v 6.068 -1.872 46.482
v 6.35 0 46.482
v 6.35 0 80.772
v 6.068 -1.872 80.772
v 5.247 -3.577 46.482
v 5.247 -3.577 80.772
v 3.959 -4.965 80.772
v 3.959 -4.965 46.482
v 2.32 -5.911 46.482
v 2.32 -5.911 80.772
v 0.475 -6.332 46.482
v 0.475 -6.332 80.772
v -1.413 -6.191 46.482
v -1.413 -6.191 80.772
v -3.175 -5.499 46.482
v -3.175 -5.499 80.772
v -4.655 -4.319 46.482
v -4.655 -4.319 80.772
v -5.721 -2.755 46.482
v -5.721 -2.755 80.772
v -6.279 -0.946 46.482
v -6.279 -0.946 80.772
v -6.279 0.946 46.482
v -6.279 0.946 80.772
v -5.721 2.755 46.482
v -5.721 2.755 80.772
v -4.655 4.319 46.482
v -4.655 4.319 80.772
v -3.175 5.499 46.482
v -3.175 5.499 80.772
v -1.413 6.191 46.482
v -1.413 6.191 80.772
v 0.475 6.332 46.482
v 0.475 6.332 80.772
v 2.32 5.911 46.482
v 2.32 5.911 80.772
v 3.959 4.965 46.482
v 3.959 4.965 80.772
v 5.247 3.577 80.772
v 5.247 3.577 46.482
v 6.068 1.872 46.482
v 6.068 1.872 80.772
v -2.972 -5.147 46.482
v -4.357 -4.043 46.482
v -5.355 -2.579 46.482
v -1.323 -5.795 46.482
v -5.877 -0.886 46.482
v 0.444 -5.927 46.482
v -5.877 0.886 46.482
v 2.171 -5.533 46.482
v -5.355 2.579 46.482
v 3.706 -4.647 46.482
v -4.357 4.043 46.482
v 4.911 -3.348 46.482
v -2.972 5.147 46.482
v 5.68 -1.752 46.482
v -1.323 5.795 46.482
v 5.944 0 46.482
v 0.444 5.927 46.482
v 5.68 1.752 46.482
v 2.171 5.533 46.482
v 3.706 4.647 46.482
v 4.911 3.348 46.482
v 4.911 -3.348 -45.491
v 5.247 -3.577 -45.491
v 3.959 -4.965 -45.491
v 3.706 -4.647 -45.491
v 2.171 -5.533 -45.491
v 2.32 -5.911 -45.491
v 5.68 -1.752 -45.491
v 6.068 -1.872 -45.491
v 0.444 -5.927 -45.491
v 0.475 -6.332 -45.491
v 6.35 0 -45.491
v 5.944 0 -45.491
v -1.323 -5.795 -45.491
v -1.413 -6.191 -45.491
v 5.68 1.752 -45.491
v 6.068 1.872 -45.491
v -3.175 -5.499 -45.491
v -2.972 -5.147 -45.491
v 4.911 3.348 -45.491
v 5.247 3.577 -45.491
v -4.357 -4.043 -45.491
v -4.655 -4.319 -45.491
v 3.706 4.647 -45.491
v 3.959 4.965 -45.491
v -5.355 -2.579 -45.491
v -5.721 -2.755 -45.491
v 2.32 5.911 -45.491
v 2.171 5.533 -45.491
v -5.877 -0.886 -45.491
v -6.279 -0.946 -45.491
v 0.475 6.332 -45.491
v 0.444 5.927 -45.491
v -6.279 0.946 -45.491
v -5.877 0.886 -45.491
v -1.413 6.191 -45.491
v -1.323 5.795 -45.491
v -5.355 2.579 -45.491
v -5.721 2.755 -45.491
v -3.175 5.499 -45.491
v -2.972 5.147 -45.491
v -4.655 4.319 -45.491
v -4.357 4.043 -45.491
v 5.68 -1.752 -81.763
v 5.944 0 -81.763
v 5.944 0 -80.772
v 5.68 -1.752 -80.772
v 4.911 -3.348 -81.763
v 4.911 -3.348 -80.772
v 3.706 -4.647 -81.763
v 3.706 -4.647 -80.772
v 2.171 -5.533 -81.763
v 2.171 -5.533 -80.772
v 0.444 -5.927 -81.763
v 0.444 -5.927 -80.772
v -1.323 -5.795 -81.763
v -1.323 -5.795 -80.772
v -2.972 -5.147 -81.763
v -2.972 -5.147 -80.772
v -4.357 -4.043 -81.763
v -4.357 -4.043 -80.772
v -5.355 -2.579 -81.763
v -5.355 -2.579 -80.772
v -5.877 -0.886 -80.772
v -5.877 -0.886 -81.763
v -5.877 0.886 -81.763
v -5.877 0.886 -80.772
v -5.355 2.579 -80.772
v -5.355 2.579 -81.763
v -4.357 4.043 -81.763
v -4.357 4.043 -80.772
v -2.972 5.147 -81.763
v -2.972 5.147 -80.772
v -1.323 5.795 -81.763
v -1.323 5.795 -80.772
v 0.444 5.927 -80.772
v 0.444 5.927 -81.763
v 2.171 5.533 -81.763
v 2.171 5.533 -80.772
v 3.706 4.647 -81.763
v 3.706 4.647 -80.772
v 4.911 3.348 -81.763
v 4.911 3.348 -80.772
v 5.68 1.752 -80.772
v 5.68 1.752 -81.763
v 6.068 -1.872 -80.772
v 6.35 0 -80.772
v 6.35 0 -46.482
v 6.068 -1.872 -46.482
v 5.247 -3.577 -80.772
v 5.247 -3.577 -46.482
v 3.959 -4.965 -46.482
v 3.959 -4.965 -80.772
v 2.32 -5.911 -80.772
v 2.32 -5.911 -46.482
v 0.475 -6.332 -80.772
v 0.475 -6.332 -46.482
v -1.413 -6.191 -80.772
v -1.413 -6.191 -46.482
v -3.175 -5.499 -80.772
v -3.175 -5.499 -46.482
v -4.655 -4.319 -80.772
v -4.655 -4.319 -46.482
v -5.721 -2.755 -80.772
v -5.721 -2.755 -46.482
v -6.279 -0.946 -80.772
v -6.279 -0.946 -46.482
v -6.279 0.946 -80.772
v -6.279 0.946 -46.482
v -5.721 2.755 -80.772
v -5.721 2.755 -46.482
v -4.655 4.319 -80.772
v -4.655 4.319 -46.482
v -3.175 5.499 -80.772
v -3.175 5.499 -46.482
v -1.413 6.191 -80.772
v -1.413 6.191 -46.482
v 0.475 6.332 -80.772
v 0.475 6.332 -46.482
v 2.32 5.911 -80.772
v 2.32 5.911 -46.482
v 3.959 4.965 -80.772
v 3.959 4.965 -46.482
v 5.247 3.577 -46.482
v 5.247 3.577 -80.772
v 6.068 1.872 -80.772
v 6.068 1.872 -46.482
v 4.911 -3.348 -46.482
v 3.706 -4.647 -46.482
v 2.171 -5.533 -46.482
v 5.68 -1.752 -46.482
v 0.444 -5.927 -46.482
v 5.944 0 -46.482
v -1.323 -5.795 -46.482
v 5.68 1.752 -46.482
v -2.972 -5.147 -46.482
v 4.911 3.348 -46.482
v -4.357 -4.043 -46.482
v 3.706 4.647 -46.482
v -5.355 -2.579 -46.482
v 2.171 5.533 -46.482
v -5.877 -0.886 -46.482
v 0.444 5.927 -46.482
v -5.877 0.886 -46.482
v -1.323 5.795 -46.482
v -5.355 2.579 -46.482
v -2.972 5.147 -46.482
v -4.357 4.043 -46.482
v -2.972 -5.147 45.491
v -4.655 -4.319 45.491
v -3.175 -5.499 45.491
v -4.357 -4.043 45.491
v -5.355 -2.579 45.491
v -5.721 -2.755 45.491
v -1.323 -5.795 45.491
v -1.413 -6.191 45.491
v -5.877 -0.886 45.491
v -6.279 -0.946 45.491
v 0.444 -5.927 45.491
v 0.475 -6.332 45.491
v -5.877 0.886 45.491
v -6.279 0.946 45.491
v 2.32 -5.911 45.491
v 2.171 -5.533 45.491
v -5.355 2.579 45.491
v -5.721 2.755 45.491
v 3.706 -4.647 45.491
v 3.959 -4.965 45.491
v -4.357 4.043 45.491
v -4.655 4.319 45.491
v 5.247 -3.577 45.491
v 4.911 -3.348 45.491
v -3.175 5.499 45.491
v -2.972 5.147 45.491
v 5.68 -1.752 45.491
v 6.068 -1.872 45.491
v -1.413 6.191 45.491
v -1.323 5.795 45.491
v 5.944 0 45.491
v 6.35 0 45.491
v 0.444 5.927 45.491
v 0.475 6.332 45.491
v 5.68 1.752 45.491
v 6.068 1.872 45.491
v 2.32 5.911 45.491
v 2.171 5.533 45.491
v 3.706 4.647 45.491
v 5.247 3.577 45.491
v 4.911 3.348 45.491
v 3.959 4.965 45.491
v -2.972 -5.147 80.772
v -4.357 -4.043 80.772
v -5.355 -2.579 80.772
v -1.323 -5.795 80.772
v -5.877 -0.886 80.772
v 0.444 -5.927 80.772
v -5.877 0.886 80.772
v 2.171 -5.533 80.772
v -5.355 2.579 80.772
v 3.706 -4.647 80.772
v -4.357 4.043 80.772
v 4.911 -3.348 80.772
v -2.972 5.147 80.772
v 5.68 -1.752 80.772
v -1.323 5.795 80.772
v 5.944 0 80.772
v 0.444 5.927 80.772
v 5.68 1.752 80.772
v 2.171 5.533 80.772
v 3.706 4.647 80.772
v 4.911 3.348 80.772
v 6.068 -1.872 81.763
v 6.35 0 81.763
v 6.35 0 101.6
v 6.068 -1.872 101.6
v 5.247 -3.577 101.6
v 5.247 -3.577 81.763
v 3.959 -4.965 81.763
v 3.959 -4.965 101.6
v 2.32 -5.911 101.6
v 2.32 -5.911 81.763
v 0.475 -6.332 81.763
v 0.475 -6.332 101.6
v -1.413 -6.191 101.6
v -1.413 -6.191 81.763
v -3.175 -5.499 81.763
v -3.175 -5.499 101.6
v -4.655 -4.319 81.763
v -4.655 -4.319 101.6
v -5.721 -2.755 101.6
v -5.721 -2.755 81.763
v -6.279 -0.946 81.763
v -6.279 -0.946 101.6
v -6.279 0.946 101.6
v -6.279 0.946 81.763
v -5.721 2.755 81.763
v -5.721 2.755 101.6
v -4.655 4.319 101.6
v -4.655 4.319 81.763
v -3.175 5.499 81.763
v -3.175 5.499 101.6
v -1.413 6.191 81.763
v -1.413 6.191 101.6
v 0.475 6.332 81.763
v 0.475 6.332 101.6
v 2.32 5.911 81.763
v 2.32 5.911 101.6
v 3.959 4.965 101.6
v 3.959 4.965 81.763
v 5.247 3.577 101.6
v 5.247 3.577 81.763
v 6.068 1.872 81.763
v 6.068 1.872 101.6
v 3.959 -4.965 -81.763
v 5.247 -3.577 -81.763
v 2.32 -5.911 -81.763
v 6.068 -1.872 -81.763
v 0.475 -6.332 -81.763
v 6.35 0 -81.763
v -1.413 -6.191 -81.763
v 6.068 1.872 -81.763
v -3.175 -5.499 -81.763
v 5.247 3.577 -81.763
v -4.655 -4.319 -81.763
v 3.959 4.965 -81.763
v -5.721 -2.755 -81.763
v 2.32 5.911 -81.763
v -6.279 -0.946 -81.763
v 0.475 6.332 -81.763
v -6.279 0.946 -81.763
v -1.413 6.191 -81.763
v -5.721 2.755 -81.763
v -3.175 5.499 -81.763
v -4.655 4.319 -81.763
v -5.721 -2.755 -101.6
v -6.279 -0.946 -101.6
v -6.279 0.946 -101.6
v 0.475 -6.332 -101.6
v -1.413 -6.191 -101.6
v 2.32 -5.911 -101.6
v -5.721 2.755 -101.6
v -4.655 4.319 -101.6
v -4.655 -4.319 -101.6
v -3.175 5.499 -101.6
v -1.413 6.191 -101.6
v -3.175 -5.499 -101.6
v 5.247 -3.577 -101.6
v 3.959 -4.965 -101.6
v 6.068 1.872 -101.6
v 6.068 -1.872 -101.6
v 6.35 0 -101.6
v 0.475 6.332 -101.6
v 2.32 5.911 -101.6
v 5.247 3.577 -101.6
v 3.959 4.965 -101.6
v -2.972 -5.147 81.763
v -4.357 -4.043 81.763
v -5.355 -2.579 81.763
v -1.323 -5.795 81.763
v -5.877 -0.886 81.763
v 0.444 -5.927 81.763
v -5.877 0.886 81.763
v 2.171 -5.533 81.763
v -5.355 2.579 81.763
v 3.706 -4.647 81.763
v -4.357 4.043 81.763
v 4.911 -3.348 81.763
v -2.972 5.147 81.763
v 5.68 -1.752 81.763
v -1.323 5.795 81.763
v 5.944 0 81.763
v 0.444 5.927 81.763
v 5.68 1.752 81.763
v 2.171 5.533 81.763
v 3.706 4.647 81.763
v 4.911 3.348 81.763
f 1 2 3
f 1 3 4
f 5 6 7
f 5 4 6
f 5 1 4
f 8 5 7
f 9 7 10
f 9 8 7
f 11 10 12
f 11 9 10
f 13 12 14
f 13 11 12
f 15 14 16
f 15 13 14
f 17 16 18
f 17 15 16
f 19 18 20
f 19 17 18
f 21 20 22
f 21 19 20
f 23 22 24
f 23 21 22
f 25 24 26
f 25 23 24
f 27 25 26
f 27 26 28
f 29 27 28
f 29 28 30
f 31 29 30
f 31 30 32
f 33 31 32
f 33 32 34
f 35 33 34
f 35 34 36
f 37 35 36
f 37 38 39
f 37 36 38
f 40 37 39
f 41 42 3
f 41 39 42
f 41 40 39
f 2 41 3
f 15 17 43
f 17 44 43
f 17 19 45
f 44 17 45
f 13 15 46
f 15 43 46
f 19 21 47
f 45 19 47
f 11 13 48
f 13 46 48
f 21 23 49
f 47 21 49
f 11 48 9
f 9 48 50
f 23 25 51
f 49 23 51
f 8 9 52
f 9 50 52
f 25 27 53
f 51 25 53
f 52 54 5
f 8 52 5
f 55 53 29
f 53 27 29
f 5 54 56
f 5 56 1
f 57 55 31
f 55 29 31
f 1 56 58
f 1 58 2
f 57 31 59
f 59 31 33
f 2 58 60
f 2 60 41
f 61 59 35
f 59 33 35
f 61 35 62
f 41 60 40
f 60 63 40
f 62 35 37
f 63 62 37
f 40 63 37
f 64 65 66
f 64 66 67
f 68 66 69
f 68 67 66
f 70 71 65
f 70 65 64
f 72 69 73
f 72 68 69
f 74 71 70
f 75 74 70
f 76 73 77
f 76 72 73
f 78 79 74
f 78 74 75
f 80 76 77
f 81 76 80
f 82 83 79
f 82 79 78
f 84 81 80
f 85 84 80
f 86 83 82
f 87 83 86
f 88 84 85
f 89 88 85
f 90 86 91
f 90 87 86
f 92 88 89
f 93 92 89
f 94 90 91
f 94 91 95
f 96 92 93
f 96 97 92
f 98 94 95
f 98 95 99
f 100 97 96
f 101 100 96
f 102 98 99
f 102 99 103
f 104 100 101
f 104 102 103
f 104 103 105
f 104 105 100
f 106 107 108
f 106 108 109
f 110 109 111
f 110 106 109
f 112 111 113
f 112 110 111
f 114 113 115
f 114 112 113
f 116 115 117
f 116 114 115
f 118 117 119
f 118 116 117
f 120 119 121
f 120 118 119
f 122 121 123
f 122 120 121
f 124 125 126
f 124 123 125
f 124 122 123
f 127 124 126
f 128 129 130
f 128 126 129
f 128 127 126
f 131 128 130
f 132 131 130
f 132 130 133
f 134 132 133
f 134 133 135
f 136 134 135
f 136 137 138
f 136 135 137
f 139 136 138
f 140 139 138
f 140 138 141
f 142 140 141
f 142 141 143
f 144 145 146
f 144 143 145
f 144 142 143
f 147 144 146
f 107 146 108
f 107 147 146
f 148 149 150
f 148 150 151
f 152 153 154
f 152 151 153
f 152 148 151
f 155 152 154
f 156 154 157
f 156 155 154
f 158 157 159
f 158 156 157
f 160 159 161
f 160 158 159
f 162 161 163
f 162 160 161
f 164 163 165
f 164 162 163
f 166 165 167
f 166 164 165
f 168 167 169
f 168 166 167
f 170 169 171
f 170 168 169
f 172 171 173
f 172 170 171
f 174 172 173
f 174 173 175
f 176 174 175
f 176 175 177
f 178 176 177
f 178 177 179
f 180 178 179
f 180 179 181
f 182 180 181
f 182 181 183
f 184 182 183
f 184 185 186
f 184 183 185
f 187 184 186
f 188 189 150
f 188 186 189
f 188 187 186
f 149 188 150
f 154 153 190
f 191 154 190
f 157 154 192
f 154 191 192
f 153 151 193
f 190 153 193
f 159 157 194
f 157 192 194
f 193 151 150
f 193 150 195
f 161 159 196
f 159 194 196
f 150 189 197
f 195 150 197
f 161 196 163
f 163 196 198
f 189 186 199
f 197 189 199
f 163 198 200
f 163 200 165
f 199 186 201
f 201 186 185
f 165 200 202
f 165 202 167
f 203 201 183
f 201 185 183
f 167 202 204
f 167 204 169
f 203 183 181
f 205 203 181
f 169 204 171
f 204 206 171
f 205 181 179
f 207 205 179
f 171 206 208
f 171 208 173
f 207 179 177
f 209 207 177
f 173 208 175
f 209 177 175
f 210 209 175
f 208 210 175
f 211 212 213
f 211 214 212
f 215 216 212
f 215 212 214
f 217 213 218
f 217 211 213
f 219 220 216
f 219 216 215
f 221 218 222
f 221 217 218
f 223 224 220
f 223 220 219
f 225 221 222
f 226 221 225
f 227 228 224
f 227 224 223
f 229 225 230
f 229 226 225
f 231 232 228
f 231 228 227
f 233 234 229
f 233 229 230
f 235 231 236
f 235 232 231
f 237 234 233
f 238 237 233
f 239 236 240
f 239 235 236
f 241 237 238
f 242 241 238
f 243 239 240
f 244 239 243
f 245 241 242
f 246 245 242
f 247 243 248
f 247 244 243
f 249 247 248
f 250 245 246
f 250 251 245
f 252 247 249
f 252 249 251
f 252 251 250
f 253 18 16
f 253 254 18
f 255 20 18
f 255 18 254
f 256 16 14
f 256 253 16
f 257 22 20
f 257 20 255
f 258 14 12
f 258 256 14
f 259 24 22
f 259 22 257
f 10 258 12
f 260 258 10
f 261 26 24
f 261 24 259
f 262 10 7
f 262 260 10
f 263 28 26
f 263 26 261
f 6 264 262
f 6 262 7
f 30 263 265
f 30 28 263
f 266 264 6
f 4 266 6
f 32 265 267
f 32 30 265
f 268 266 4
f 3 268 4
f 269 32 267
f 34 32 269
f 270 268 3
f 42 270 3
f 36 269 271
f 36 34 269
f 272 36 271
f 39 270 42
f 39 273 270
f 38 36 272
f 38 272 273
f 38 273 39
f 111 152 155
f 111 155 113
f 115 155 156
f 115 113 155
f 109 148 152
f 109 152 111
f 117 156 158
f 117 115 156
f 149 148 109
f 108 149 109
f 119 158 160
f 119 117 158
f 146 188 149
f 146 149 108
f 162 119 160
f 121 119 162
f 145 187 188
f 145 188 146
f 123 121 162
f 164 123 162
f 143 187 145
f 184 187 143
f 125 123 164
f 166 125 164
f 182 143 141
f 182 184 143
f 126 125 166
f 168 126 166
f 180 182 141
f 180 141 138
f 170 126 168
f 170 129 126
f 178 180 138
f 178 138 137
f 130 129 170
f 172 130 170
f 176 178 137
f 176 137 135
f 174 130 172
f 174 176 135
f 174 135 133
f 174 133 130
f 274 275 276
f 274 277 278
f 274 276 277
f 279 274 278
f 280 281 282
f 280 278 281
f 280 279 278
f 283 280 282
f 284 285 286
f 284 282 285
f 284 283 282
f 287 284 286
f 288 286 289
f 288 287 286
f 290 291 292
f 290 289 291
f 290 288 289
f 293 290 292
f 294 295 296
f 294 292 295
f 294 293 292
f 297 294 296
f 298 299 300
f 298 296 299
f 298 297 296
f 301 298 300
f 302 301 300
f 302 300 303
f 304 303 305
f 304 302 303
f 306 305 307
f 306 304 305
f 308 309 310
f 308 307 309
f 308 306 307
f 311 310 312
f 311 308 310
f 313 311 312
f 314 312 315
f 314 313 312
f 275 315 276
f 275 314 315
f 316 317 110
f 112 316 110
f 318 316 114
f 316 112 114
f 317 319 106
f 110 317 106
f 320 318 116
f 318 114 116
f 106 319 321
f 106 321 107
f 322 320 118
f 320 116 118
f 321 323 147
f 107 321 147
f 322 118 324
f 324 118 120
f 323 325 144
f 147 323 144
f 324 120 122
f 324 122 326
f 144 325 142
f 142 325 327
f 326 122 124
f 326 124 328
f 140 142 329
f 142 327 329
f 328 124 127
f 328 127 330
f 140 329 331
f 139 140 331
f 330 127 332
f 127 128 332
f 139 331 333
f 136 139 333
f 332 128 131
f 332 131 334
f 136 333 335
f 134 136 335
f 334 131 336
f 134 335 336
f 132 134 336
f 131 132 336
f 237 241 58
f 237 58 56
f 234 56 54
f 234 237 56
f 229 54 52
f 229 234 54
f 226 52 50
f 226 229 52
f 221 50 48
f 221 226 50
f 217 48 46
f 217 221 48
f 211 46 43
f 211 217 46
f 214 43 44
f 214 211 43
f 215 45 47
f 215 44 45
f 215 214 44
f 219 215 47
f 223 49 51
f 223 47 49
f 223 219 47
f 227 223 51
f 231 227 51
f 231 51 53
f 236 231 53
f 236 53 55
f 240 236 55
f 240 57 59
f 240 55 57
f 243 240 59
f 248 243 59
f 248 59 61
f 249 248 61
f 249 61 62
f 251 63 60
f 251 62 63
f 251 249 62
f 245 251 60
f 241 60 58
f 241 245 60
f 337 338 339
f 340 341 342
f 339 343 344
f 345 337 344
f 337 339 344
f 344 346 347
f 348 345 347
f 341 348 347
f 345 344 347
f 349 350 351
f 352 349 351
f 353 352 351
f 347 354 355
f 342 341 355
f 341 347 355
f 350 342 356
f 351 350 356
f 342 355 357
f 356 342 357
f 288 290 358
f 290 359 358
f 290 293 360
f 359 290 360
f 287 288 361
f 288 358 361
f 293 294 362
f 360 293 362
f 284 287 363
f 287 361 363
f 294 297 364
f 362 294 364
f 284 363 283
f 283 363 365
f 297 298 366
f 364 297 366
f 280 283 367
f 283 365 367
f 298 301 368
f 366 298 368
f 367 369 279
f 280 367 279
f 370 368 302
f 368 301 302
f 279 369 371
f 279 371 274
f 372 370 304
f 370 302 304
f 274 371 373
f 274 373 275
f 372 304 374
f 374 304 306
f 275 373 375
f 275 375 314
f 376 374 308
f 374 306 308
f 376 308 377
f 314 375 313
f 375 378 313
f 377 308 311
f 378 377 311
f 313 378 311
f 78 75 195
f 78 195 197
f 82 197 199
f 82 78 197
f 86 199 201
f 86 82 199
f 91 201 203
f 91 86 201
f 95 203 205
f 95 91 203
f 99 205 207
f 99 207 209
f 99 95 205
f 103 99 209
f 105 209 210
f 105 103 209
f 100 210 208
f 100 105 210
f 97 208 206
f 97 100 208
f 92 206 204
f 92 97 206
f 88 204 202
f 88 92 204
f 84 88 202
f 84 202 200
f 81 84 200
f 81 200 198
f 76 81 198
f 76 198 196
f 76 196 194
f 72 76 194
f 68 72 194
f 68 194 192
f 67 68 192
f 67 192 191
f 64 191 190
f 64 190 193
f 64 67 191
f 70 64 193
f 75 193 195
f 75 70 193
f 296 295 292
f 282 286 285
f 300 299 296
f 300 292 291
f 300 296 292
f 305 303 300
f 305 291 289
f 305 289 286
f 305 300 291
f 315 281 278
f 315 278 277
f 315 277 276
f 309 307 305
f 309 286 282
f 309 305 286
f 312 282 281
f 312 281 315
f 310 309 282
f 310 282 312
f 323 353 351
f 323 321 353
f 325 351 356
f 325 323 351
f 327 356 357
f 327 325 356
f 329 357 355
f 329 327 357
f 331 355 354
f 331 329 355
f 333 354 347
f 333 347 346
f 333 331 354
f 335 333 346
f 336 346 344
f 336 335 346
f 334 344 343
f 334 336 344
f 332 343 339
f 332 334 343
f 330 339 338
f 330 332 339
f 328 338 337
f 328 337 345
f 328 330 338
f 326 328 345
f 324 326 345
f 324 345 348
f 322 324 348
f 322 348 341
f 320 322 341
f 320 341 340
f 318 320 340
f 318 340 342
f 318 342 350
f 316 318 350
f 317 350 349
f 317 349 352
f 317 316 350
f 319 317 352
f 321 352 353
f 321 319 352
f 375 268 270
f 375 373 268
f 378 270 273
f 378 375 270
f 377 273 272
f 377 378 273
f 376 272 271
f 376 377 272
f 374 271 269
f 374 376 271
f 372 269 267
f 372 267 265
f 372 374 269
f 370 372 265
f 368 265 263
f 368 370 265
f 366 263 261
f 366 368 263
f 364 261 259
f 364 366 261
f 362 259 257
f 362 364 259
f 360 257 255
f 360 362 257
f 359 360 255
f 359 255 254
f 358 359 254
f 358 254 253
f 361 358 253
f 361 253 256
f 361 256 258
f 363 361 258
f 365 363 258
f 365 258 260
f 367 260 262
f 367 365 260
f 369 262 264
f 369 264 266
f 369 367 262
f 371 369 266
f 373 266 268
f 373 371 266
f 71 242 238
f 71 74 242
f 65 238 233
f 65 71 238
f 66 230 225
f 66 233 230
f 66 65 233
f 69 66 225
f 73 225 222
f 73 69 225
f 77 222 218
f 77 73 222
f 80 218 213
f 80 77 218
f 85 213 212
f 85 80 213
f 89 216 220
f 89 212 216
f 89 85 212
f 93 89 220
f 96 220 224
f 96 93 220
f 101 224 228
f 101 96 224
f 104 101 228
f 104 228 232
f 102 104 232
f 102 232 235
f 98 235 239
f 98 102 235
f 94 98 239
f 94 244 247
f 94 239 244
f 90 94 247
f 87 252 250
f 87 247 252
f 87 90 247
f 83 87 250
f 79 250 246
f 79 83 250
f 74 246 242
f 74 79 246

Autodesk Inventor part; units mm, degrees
ref_plane "YZ Plane" through (0, 0, 0) normal (1, 0, 0) x (0, 1, 0)
ref_plane "XZ Plane" through (0, 0, 0) normal (0, 1, 0) x (-1, 0, 0)
sketch "Sketch1" plane through (0, 0, 0) normal (0, 0, 1) x (1, 0, 0)
  circle A0 centre (0, 0) radius 6.35
  dimension "d0" = 12.7
extrude "Extrusion1" add sketch "Sketch1" along normal mid plane 203.2
ref_plane "Work Plane1" through (0, 0, 81.7626) normal (0, 0, 1) x (1, 0, 0)
sketch "Sketch2" plane through (0, 0, 81.7626) normal (0, 0, 1) x (1, 0, 0)
  circle A0 centre (0, 0) radius 6.35 projected
  circle A1 centre (0, 0) radius 6.35
  circle A2 centre (0, 0) radius 5.9436
  dimension "d4" = 12.7
  dimension "d5" = 11.8872
extrude "Extrusion2" cut sketch "Sketch2" against normal blind 0.9906
mirror "Mirror1" about plane through (0, 0, 0) normal (0, 0, 1) of "Extrusion2"
ref_plane "Work Plane3" through (0, 0, 45.4914) normal (0, 0, 1) x (1, 0, 0)
sketch "Sketch3" plane through (0, 0, 45.4914) normal (0, 0, 1) x (1, 0, 0)
  circle A0 centre (0, 0) radius 6.35 projected
  circle A1 centre (0, 0) radius 6.35
  circle A2 centre (0, 0) radius 5.9436
  dimension "d9" = 12.7
  dimension "d10" = 11.8872
extrude "Extrusion3" cut sketch "Sketch3" along normal blind 0.9906
mirror "Mirror2" about plane through (0, 0, 0) normal (0, 0, 1) of "Extrusion3"
ref_plane "Work Plane2" through (0, 0, -81.7626) normal (0, 0, 1) x (1, 0, 0)
ref_plane "Work Plane4" through (0, 0, -45.4914) normal (0, 0, 1) x (1, 0, 0)
properties part number "Boom to Stick .5in. Pin" material "Aluminum 6061"
